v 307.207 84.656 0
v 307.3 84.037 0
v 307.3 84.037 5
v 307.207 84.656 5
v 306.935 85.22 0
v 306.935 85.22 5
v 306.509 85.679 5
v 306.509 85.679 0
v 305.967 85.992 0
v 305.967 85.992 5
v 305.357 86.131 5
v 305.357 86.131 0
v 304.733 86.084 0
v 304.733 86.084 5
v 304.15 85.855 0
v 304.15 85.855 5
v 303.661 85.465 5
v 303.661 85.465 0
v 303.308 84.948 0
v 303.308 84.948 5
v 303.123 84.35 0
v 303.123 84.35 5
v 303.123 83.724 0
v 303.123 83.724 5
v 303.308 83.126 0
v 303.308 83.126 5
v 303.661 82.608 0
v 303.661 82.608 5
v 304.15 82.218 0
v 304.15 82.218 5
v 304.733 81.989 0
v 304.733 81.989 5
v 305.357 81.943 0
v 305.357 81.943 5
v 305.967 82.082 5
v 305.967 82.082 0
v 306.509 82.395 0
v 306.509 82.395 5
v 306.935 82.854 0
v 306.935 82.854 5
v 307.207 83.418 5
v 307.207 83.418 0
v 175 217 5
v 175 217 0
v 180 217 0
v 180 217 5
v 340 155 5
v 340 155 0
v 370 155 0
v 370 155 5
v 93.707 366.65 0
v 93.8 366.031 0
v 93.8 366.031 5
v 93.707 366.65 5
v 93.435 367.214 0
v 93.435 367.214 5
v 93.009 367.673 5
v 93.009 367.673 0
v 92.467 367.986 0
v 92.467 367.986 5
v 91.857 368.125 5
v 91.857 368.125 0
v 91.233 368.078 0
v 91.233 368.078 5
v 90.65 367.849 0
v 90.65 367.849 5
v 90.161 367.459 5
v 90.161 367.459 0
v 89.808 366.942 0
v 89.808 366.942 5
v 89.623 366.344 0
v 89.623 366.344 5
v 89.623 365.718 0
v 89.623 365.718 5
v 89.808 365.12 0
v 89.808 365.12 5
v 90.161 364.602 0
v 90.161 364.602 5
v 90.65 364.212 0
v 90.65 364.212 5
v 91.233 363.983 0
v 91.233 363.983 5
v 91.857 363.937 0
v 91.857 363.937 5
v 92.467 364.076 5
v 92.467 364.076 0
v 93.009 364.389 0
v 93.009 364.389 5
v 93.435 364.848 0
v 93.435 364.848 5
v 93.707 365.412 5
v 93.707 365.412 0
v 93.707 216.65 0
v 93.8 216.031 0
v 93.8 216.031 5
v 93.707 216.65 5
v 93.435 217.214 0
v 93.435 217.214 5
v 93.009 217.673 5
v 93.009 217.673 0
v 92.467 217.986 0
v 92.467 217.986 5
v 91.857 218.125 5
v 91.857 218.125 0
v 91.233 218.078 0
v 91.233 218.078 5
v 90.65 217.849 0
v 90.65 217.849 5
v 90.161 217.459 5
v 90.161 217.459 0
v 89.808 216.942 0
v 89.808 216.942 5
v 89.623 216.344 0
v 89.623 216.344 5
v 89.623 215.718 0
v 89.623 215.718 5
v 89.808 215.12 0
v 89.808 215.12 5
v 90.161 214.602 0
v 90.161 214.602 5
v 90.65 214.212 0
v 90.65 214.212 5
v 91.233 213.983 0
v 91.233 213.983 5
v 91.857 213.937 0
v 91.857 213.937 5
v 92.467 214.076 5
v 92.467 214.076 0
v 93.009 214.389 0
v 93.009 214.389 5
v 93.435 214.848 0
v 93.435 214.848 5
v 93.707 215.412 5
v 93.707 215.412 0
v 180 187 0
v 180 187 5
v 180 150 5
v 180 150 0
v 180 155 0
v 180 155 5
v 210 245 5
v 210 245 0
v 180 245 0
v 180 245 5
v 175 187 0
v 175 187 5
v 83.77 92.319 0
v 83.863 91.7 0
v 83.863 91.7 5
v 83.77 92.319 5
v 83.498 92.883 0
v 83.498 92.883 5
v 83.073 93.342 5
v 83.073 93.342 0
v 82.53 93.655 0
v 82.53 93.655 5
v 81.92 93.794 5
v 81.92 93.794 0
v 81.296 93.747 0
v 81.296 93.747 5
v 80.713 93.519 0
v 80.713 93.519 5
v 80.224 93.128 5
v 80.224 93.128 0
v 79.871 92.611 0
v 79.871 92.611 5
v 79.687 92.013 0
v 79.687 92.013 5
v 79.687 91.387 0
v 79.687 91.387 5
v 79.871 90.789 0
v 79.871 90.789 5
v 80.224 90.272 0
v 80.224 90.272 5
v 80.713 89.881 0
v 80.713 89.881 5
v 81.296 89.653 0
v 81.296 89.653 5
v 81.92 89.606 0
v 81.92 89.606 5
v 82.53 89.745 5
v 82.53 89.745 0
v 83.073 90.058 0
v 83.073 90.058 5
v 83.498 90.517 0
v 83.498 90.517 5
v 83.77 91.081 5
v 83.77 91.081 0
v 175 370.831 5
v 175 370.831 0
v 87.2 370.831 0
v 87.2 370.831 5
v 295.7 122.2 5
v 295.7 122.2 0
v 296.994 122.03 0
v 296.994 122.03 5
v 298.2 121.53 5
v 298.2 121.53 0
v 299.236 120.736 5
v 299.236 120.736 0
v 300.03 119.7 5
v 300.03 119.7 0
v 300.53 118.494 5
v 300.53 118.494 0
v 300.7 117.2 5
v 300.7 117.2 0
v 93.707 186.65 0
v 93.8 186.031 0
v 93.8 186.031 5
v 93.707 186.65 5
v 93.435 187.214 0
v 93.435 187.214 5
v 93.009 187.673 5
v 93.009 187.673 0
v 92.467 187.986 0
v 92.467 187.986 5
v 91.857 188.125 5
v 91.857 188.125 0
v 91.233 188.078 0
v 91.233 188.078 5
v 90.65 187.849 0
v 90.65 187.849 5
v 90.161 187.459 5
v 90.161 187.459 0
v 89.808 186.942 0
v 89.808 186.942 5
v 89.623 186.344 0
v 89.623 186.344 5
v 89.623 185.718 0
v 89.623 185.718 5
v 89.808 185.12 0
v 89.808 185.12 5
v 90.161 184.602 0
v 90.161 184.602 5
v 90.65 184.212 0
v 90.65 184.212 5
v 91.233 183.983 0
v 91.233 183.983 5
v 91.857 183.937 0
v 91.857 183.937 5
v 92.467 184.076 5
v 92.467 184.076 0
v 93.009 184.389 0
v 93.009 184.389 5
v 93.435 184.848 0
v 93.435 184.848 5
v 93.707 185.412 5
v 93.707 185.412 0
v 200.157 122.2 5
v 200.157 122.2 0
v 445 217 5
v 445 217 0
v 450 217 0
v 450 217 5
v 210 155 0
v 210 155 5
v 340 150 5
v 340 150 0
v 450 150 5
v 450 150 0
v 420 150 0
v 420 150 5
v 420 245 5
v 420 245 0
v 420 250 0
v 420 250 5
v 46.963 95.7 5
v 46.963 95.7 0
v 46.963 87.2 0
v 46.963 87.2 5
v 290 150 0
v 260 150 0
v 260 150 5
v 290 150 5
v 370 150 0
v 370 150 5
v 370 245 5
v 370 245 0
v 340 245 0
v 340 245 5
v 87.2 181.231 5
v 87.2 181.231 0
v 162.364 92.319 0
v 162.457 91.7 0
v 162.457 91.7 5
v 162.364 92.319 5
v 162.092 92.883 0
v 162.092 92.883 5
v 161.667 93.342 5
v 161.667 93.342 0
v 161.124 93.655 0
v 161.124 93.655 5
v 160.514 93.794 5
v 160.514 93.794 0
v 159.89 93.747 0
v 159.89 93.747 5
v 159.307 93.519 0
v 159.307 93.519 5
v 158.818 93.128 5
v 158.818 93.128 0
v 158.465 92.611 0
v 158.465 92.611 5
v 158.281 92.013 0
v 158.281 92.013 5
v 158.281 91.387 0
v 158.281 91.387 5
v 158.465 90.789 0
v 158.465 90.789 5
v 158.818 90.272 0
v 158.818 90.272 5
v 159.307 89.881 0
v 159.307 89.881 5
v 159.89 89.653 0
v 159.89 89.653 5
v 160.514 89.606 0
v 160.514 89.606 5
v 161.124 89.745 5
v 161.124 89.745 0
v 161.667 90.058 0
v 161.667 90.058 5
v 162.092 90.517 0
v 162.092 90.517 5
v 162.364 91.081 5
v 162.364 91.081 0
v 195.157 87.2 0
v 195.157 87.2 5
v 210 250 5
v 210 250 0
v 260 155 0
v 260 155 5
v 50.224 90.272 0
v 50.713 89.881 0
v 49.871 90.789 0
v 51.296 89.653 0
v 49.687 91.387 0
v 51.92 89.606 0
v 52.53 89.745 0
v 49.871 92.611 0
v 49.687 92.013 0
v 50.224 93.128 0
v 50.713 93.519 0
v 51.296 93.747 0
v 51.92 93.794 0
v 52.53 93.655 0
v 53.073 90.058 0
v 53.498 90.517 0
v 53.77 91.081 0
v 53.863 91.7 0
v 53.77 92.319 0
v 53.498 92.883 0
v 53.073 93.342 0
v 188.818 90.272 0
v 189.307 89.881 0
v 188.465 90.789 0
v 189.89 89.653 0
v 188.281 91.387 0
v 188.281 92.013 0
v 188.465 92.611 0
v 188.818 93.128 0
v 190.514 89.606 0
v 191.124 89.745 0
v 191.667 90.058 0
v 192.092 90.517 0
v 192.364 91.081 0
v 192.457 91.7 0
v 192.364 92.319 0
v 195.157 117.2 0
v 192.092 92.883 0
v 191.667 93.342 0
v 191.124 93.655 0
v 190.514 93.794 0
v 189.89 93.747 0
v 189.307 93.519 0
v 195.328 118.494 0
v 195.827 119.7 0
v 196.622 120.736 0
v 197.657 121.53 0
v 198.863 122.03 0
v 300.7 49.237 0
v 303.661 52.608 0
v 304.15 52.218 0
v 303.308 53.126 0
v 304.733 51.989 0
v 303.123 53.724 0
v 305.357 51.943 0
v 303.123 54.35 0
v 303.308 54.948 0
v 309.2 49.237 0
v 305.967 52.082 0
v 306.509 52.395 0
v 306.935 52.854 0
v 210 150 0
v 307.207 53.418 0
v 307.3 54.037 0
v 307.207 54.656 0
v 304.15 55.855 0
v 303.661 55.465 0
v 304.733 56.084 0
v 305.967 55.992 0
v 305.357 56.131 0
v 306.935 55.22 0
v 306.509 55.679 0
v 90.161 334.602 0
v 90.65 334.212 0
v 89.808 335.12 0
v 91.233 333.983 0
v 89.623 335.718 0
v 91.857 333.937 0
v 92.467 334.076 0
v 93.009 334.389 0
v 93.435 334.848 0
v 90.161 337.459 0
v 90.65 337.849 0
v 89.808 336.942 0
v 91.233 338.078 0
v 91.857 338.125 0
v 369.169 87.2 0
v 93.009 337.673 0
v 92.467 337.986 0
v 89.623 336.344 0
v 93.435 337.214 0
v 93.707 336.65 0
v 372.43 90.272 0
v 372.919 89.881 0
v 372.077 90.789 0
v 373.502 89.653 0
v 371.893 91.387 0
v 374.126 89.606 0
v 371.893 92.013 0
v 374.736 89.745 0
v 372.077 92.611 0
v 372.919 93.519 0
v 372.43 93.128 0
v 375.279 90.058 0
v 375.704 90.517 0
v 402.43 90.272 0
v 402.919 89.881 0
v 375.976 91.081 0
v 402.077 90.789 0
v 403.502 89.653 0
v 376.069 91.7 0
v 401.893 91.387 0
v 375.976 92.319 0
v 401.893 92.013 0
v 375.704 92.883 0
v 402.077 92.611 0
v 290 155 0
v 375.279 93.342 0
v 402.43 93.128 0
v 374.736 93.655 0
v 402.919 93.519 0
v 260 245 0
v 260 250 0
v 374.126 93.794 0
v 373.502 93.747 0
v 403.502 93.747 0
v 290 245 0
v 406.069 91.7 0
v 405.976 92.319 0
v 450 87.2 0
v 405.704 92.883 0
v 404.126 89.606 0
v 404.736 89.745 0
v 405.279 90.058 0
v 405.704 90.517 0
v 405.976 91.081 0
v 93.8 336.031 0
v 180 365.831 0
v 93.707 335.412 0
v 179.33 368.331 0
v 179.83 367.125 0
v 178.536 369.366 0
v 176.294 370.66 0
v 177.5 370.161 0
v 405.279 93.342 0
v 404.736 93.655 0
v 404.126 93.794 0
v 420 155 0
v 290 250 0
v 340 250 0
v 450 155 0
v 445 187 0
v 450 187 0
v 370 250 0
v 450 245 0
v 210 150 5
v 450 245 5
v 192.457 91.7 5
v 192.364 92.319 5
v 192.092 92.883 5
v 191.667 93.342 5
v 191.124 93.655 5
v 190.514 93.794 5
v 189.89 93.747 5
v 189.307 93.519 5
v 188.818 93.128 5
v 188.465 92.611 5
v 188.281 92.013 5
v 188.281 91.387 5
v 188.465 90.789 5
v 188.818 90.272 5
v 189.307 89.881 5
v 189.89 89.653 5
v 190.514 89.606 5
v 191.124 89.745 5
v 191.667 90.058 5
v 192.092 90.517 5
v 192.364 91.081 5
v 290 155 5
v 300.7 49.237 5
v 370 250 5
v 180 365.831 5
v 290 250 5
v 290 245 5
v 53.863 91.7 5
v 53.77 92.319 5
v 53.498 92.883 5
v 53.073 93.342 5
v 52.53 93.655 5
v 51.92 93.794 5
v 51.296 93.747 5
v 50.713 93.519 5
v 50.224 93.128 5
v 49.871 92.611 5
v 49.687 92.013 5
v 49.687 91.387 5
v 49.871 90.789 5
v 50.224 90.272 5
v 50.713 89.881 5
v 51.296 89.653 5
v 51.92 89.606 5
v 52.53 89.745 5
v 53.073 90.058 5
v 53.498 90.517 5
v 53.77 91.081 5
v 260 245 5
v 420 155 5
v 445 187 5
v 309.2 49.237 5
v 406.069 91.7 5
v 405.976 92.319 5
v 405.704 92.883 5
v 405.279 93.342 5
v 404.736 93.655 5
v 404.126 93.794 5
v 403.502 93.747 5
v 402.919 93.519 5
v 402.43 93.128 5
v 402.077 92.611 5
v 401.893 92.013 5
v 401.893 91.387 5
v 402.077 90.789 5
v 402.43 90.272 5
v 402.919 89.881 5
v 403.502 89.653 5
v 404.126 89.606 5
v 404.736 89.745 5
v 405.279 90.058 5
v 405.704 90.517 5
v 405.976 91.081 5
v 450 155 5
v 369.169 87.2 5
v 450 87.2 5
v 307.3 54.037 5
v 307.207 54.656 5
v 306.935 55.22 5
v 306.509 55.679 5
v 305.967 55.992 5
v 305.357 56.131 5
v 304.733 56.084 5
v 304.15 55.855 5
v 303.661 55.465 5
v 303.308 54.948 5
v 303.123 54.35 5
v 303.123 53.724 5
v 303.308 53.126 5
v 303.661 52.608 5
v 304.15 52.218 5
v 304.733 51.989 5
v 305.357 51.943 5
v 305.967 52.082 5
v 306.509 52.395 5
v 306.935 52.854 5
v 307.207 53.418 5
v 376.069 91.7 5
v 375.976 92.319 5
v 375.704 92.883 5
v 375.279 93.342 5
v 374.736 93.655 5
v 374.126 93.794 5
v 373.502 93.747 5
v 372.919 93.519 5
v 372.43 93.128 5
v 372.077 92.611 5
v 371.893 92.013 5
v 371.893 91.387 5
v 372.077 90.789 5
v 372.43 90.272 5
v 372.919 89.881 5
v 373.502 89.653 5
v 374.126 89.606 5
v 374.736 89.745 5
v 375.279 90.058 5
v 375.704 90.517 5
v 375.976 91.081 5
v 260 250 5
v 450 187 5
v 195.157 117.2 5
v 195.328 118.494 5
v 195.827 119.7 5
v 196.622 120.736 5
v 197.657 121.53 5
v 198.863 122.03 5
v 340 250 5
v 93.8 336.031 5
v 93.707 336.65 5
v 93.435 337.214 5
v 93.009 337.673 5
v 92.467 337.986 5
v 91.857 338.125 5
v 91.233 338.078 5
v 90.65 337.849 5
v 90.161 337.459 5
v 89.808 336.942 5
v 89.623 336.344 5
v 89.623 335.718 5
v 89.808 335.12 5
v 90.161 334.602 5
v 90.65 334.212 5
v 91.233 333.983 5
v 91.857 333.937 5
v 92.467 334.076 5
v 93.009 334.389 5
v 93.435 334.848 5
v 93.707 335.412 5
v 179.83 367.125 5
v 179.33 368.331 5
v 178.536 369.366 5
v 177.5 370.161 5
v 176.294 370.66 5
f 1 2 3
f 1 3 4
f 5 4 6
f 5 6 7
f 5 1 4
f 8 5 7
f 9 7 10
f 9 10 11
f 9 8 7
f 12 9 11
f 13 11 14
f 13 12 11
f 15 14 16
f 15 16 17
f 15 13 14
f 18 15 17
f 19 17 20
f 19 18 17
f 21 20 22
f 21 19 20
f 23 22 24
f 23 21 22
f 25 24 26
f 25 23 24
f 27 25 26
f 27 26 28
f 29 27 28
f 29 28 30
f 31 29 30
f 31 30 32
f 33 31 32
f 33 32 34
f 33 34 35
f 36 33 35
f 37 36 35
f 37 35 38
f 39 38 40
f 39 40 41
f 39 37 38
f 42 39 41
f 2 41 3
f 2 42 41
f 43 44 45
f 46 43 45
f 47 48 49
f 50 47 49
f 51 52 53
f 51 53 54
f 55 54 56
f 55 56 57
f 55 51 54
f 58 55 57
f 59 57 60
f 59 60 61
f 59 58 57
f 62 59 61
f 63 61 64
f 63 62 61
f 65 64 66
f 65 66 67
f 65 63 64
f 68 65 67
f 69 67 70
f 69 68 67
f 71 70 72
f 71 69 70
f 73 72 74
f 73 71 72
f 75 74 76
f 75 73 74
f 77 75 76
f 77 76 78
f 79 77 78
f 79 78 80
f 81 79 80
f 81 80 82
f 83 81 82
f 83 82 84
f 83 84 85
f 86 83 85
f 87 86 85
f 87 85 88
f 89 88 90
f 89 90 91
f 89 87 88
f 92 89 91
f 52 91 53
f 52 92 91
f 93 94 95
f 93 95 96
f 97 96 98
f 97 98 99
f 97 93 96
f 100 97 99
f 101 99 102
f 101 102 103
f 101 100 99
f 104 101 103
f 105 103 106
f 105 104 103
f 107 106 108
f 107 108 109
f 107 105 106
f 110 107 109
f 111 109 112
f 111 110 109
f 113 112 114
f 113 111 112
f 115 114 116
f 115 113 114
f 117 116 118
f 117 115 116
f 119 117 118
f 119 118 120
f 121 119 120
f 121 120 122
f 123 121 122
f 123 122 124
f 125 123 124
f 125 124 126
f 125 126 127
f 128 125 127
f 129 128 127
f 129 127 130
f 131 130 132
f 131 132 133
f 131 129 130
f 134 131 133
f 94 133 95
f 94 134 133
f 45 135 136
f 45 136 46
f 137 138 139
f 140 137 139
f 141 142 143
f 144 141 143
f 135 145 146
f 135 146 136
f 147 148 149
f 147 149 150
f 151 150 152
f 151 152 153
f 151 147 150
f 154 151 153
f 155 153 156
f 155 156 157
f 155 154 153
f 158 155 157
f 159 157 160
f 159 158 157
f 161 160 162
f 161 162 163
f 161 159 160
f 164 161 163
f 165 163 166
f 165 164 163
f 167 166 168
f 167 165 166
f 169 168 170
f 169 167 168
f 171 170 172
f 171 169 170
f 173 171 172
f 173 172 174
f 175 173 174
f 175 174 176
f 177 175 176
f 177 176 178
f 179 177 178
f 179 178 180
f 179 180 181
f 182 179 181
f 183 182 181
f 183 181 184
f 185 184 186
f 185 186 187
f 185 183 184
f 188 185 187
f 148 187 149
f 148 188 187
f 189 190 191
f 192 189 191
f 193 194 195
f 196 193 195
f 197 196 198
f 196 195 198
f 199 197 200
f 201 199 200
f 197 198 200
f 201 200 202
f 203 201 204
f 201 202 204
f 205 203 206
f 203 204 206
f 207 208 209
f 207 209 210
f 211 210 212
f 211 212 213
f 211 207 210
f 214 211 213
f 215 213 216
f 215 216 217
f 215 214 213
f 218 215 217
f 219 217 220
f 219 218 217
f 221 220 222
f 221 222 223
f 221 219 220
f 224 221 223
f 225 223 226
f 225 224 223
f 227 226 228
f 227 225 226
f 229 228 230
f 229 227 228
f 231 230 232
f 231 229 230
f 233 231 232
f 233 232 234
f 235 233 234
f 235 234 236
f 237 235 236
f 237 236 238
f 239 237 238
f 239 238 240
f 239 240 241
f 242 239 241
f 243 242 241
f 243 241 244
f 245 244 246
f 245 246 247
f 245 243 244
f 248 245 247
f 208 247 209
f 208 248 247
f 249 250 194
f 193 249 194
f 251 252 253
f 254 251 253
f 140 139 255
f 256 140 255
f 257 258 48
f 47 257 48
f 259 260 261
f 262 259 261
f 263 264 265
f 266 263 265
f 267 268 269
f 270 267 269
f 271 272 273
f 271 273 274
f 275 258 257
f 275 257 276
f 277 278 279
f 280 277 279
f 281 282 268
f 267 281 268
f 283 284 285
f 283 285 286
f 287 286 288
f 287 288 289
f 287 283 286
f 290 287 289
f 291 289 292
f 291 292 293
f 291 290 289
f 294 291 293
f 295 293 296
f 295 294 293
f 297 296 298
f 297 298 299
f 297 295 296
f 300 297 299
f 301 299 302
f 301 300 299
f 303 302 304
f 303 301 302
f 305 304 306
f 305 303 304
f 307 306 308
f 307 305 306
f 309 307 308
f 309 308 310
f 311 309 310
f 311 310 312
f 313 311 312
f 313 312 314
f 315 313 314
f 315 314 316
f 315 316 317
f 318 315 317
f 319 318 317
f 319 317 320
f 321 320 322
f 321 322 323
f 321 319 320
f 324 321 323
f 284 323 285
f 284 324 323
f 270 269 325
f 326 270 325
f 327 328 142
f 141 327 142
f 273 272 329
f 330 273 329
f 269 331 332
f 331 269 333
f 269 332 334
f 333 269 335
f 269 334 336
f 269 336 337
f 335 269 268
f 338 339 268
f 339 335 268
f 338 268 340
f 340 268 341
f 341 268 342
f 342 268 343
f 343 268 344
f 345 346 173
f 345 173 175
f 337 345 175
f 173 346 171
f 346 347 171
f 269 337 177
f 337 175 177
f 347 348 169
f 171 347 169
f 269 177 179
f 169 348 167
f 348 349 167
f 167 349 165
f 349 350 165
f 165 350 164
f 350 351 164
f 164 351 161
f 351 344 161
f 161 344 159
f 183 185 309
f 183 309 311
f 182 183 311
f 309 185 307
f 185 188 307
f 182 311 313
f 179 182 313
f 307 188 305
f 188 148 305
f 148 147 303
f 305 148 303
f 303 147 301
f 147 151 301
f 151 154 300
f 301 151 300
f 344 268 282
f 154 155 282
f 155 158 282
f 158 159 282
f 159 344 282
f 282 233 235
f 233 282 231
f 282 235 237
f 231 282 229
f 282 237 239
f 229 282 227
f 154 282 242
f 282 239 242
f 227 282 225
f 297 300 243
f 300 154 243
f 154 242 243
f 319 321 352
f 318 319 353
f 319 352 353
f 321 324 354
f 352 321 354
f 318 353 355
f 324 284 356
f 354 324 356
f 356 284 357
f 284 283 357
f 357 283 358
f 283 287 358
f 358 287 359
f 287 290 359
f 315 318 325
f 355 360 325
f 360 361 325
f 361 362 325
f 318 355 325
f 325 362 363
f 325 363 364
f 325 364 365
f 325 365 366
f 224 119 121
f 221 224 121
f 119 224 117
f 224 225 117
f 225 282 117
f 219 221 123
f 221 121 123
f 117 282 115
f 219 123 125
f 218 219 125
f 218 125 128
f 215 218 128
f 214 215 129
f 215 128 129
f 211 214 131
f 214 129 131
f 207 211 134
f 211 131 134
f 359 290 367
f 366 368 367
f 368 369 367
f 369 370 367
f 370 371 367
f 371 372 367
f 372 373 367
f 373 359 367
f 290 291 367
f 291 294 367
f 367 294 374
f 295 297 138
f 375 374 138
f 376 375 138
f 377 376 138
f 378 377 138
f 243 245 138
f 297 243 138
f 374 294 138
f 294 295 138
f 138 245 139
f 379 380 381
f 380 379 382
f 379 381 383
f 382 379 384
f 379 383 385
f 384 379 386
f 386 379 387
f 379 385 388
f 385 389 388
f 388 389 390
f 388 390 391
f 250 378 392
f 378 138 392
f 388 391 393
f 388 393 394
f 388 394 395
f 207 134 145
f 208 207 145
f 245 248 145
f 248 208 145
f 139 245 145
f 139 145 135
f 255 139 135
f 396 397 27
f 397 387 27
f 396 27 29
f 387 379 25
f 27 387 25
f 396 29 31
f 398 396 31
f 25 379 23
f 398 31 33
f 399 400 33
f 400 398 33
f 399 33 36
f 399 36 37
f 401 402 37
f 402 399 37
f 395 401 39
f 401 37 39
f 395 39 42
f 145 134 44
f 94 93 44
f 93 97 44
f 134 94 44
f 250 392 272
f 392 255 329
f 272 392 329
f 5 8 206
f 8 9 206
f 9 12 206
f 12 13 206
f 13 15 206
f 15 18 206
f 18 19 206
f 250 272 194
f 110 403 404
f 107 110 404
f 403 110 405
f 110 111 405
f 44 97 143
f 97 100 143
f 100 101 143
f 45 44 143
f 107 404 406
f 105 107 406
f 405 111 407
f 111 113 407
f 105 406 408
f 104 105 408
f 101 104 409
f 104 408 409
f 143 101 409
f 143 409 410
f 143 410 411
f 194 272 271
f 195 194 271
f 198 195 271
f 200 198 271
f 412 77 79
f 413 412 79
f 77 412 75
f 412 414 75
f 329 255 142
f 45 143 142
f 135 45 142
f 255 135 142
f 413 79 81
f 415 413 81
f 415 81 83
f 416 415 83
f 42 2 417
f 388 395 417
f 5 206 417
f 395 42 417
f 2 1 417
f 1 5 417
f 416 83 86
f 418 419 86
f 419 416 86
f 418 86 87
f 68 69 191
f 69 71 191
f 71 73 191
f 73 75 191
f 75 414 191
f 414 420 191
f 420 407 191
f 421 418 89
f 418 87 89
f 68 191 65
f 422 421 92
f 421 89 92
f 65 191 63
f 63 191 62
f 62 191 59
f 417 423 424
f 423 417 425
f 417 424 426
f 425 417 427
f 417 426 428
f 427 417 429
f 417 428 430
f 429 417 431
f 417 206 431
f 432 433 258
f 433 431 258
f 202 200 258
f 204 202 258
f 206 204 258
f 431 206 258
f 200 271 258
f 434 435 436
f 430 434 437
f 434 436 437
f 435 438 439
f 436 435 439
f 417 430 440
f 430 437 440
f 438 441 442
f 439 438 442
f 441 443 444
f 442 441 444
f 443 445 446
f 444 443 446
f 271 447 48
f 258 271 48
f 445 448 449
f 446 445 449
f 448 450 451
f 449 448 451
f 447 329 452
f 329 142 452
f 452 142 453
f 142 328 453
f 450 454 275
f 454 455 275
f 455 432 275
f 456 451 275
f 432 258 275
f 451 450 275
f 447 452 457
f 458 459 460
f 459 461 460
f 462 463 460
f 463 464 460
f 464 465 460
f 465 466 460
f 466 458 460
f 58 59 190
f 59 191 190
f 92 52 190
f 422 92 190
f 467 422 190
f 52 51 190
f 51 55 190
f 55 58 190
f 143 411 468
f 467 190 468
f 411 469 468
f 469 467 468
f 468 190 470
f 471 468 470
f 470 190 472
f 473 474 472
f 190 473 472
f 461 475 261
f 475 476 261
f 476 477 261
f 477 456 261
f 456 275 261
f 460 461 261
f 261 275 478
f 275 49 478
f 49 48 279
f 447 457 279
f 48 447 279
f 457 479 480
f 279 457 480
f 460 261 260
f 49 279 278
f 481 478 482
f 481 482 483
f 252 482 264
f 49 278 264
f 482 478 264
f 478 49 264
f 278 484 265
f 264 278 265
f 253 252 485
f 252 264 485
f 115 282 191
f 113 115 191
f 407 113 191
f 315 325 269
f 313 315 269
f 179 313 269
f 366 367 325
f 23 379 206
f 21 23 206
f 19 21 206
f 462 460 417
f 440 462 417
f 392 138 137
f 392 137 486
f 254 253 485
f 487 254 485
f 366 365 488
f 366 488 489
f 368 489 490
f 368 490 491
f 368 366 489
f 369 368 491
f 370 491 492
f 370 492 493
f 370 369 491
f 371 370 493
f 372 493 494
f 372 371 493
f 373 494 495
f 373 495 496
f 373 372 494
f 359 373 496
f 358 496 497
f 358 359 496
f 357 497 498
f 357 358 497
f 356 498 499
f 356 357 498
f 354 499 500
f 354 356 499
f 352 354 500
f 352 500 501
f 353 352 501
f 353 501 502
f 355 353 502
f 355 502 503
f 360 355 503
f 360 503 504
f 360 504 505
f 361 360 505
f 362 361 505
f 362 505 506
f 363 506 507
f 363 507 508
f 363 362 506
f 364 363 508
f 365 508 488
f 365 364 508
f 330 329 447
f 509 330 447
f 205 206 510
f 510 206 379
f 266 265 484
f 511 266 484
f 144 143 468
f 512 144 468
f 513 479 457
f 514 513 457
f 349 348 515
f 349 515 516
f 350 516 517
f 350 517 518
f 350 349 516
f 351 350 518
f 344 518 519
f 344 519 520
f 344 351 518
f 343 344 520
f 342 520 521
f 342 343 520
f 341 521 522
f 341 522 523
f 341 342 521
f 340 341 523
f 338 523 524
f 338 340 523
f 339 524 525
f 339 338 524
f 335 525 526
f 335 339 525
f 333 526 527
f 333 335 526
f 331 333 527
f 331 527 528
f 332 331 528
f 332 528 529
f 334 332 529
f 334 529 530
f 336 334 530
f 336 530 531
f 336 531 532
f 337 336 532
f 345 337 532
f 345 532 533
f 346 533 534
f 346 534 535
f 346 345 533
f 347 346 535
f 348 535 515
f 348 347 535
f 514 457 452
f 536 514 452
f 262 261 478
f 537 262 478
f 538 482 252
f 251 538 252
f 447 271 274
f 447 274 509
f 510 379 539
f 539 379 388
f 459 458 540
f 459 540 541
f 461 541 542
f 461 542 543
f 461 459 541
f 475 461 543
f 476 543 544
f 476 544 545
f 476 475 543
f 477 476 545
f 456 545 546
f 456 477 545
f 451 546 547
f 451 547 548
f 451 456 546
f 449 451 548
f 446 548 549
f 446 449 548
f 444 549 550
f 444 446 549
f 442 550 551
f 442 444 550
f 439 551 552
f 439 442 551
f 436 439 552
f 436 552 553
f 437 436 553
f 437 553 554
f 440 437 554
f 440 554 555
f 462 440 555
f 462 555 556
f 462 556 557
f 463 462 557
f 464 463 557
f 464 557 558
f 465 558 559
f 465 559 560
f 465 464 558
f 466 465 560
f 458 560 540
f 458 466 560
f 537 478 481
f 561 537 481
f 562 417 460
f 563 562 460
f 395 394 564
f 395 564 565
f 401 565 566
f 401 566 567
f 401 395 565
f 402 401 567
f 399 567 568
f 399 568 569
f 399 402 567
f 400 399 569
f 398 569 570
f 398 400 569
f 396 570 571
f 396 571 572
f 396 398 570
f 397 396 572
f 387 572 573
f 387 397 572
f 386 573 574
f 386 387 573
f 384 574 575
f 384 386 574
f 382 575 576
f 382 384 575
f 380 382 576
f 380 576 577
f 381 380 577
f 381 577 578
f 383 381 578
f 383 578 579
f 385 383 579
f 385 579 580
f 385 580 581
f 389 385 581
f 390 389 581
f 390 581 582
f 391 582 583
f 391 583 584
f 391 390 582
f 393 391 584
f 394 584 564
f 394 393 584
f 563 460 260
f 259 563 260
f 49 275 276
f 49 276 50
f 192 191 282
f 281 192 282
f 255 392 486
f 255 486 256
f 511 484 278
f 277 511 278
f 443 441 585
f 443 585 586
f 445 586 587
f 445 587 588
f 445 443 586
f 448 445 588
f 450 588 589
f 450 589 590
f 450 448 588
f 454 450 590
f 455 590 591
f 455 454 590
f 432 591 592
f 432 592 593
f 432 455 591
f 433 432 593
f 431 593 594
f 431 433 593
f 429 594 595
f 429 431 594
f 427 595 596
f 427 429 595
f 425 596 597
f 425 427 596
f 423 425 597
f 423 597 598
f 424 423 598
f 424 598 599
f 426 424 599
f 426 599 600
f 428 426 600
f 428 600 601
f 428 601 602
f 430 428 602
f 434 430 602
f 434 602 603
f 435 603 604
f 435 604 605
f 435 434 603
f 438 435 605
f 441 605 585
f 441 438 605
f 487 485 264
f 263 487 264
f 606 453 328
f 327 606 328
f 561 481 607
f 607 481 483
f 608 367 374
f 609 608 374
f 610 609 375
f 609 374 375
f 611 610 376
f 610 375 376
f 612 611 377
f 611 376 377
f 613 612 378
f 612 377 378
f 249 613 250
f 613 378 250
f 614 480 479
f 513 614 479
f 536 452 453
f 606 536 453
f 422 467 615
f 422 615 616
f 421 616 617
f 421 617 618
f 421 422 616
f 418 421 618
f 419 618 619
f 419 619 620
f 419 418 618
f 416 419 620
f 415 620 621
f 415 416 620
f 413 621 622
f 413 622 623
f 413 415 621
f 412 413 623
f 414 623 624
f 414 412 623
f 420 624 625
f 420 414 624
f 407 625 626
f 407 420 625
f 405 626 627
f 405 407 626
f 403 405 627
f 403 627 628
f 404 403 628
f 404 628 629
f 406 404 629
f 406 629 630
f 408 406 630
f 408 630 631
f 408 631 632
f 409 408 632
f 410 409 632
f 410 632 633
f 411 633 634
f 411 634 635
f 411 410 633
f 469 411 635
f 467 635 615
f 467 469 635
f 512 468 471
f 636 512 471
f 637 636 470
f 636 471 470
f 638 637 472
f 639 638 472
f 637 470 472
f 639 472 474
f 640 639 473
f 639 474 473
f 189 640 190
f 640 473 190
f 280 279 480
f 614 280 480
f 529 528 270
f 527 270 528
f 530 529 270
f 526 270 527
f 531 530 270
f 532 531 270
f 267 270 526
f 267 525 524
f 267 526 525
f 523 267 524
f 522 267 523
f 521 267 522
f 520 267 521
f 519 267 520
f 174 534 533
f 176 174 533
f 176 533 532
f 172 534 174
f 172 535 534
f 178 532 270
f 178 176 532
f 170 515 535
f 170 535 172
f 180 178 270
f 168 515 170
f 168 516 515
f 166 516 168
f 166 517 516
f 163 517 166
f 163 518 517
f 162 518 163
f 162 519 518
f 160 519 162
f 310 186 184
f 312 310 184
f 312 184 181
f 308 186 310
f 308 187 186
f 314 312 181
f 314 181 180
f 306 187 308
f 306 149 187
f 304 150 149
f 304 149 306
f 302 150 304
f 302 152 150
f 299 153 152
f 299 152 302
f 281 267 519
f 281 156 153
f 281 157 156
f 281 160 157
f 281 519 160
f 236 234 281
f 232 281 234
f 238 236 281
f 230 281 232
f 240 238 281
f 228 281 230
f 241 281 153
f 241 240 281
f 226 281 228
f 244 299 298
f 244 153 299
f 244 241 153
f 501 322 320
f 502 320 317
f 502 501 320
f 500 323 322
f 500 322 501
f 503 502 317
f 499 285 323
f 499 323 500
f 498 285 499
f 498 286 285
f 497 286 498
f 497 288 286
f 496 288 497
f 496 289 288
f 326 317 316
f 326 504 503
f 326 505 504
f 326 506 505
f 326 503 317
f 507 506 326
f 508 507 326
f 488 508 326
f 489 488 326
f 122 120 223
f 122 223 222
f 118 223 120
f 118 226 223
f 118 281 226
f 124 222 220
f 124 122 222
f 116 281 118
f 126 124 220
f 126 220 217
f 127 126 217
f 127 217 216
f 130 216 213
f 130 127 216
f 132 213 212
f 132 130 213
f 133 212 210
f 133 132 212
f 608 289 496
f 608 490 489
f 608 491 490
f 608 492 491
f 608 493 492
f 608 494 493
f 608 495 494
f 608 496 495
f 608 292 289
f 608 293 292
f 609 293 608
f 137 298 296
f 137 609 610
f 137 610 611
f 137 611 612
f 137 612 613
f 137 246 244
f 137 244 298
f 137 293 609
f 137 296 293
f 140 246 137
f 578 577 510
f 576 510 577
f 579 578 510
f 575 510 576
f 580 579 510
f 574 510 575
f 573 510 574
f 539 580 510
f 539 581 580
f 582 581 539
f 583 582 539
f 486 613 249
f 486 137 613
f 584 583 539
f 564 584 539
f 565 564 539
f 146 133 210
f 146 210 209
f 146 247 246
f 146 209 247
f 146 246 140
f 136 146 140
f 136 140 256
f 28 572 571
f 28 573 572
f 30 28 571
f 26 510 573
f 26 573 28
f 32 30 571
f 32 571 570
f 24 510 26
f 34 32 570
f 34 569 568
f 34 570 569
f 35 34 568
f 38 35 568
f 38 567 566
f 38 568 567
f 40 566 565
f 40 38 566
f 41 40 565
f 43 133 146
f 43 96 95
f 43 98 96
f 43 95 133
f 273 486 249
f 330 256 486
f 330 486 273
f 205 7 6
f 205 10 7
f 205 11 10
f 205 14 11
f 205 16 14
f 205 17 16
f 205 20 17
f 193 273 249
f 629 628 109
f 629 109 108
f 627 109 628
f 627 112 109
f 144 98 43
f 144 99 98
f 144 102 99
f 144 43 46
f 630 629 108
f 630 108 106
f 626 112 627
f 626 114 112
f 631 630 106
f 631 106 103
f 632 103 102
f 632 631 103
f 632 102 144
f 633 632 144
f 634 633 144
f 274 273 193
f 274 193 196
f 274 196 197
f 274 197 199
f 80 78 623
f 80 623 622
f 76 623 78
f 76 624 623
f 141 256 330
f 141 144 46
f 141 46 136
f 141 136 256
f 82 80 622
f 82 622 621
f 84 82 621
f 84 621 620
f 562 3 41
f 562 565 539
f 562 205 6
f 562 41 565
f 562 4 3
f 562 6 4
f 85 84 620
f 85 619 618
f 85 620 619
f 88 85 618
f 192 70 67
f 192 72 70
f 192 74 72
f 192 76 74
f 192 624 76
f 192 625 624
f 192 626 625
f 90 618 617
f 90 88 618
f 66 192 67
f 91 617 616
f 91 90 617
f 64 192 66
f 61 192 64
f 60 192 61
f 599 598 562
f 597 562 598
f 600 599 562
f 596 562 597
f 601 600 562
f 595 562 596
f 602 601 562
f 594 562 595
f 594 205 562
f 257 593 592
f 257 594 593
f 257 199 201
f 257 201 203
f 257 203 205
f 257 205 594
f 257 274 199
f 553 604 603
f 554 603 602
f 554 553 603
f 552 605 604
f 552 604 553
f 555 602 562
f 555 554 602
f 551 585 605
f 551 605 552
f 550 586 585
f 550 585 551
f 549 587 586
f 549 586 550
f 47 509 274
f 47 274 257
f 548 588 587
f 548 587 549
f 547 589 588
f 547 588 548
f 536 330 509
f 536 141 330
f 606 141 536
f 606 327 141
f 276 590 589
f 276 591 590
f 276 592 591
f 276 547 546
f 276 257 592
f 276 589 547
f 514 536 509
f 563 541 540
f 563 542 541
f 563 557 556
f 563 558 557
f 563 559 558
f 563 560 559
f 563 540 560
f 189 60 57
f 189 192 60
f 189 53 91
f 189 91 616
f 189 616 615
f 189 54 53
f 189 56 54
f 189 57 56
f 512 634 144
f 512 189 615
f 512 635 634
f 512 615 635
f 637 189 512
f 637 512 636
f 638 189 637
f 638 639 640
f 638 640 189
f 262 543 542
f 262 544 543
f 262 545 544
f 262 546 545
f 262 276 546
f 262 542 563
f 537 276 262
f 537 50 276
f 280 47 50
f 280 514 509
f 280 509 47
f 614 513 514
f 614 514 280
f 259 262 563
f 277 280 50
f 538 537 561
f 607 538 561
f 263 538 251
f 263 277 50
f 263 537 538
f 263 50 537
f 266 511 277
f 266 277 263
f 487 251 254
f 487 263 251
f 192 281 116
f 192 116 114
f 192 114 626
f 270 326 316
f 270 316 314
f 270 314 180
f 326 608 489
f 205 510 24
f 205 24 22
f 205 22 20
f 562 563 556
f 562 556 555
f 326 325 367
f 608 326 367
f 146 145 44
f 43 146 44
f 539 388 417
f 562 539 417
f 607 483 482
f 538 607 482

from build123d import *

# Parameters (mm, degrees)
SKETCH1_R           = 2.1
SKETCH1_W           = 30
SKETCH1_H           = 5
SKETCH1_W_2         = 5
SKETCH1_H_2         = 30
BOSS_EXTRUDE1_DEPTH = 5


with BuildPart() as part:
    # Sketch1 → Boss-Extrude1 (new body)
    with BuildSketch(Plane.XY):
        with BuildLine():
            Line((175, 370.830805108), (95.700000001, 370.830805108))
            Line((95.700000001, 370.830805108), (87.2, 370.830805108))
            Line((87.2, 370.830805108), (87.2, 331.230805108))
            Line((87.2, 331.230805108), (87.2, 220.830805108))
            Line((87.2, 220.830805108), (87.2, 181.230805108))
            Line((87.2, 181.230805108), (46.963204669, 95.700000001))
            Line((46.963204669, 95.700000001), (46.963204669, 87.2))
            Line((46.963204669, 87.2), (86.563204669, 87.2))
            Line((86.563204669, 87.2), (155.557214446, 87.2))
            Line((155.557214446, 87.2), (195.157214446, 87.2))
            Line((195.157214446, 87.2), (195.157214446, 117.2))
            ThreePointArc((195.157214446, 117.2), (196.62168054, 120.735533906), (200.157214446, 122.2))
            Line((200.157214446, 122.2), (295.7, 122.2))
            ThreePointArc((295.7, 122.2), (299.235533906, 120.735533906), (300.7, 117.2))
            Line((300.7, 117.2), (300.7, 88.836795331))
            Line((300.7, 88.836795331), (300.7, 49.236795331))
            Line((300.7, 49.236795331), (309.200000001, 49.236795331))
            Line((309.200000001, 49.236795331), (369.169194892, 87.2))
            Line((369.169194892, 87.2), (408.769194892, 87.2))
            Line((408.769194892, 87.2), (450, 87.2))
            Line((450, 87.2), (450, 150))
            Line((450, 150), (420, 150))
            Line((420, 150), (420, 155))
            Line((420, 155), (450, 155))
            Line((450, 155), (450, 187))
            Line((450, 187), (445, 187))
            Line((445, 187), (445, 217))
            Line((445, 217), (450, 217))
            Line((450, 217), (450, 245))
            Line((450, 245), (420, 245))
            Line((420, 245), (420, 250))
            Line((420, 250), (370, 250))
            Line((370, 250), (370, 245))
            Line((370, 245), (340, 245))
            Line((340, 245), (340, 250))
            Line((340, 250), (290, 250))
            Line((290, 250), (290, 245))
            Line((290, 245), (260, 245))
            Line((260, 245), (260, 250))
            Line((260, 250), (210, 250))
            Line((210, 250), (210, 245))
            Line((210, 245), (180, 245))
            Line((180, 245), (180, 365.830805108))
            ThreePointArc((180, 365.830805108), (178.535533906, 369.366339014), (175, 370.830805108))
        make_face()
        with Locations((51.763204669, 91.700000001)):
            Circle(SKETCH1_R, mode=Mode.SUBTRACT)
        with Locations((81.763204669, 91.700000001)):
            Circle(SKETCH1_R, mode=Mode.SUBTRACT)
        with Locations((160.357214446, 91.700000001)):
            Circle(SKETCH1_R, mode=Mode.SUBTRACT)
        with Locations((190.357214446, 91.700000001)):
            Circle(SKETCH1_R, mode=Mode.SUBTRACT)
        with Locations((91.700000001, 186.030805108)):
            Circle(SKETCH1_R, mode=Mode.SUBTRACT)
        with Locations((195, 152.5)):
            Rectangle(SKETCH1_W, SKETCH1_H, mode=Mode.SUBTRACT)
        with Locations((177.5, 202)):
            Rectangle(SKETCH1_W_2, SKETCH1_H_2, mode=Mode.SUBTRACT)
        with Locations((305.200000001, 54.036795331)):
            Circle(SKETCH1_R, mode=Mode.SUBTRACT)
        with Locations((305.200000001, 84.036795331)):
            Circle(SKETCH1_R, mode=Mode.SUBTRACT)
        with Locations((373.969194892, 91.700000001)):
            Circle(SKETCH1_R, mode=Mode.SUBTRACT)
        with Locations((403.969194892, 91.700000001)):
            Circle(SKETCH1_R, mode=Mode.SUBTRACT)
        with Locations((275, 152.5)):
            Rectangle(SKETCH1_W, SKETCH1_H, mode=Mode.SUBTRACT)
        with Locations((355, 152.5)):
            Rectangle(SKETCH1_W, SKETCH1_H, mode=Mode.SUBTRACT)
        with Locations((91.700000001, 216.030805108)):
            Circle(SKETCH1_R, mode=Mode.SUBTRACT)
        with Locations((91.700000001, 336.030805108)):
            Circle(SKETCH1_R, mode=Mode.SUBTRACT)
        with Locations((91.700000001, 366.030805108)):
            Circle(SKETCH1_R, mode=Mode.SUBTRACT)
    extrude(amount=BOSS_EXTRUDE1_DEPTH)


solid = part.part
